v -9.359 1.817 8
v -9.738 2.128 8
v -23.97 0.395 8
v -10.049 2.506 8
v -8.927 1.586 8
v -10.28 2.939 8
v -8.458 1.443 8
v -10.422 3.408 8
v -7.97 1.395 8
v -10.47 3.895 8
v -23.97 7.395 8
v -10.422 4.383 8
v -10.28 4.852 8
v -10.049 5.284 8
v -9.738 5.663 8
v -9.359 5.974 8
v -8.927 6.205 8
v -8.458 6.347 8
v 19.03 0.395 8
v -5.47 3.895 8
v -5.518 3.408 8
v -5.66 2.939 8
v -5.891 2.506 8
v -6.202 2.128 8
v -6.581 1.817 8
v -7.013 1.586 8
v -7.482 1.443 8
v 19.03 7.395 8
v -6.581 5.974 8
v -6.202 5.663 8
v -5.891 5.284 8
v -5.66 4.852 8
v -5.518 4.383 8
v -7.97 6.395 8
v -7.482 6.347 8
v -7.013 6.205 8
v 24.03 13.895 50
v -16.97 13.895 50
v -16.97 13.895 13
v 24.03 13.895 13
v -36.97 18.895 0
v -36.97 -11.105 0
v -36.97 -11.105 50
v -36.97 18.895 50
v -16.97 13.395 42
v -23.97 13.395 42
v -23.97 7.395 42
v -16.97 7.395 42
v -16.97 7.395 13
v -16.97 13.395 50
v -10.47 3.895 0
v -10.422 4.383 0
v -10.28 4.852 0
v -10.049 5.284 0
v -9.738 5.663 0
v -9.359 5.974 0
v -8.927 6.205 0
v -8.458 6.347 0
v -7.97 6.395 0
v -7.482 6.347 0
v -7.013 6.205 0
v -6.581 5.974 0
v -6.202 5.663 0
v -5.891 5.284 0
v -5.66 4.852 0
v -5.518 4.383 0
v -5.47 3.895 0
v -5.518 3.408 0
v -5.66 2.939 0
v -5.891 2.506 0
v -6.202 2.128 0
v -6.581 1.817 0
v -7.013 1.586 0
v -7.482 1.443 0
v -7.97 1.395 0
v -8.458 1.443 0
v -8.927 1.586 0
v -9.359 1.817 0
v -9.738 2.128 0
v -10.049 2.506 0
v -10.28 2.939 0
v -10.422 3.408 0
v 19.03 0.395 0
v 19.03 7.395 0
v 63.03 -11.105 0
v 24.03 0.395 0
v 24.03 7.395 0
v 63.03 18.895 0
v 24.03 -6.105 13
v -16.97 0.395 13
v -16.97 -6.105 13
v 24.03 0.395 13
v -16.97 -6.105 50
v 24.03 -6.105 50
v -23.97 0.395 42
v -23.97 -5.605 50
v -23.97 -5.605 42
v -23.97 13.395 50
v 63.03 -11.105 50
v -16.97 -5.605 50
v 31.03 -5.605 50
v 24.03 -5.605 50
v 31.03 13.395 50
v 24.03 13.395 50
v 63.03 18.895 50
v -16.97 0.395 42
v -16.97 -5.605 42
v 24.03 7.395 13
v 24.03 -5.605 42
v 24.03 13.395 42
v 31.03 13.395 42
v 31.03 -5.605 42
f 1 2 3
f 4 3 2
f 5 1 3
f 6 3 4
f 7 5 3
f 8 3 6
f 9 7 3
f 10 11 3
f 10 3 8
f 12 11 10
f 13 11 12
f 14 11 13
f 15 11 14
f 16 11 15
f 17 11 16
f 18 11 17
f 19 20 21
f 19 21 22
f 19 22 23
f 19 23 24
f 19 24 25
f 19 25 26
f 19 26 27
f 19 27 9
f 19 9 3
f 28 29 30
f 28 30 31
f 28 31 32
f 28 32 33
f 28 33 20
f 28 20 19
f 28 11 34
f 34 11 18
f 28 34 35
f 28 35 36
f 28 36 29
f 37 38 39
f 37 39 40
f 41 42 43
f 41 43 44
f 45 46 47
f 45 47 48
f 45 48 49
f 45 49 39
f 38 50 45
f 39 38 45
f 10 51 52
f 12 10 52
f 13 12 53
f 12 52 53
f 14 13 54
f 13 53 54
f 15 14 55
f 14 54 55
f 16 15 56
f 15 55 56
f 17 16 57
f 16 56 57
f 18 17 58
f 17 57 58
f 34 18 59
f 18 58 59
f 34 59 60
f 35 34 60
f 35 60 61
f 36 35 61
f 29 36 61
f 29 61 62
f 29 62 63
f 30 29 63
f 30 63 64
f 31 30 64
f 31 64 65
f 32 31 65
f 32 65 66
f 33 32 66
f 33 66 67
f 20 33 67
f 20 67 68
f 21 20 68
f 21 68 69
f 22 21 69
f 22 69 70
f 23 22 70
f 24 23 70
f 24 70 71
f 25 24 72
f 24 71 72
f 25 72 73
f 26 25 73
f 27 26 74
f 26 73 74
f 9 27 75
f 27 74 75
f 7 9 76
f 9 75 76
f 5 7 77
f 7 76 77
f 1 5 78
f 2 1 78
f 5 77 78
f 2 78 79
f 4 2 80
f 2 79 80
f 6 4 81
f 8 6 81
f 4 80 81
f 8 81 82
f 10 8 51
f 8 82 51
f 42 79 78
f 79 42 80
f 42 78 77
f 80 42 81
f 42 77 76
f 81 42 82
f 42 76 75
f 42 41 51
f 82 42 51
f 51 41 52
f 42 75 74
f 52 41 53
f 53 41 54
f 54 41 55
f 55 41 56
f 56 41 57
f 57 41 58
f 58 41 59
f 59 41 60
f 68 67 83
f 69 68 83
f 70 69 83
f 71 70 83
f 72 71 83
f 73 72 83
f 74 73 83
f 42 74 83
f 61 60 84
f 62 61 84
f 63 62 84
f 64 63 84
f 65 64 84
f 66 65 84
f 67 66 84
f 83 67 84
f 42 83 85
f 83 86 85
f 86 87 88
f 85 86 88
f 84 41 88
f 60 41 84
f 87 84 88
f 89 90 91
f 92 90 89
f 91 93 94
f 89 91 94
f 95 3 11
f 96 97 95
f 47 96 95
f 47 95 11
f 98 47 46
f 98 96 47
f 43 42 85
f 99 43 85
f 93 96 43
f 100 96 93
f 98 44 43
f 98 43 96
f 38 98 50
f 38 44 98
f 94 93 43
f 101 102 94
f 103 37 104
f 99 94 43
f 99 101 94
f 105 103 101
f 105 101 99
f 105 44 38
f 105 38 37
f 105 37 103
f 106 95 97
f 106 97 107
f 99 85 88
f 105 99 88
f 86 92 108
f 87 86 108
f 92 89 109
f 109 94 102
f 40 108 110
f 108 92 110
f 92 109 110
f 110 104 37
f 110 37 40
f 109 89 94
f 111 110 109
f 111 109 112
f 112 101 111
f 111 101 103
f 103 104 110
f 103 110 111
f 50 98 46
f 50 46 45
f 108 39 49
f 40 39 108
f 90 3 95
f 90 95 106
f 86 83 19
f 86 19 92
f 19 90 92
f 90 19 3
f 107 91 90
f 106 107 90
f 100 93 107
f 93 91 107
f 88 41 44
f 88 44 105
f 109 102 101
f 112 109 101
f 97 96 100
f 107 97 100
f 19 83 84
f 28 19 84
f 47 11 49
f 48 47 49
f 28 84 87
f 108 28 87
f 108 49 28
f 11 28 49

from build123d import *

# Parameters (mm, degrees)
SKETCH_1_W          = 100
SKETCH_1_H          = 30
EXTRUDE_1_DEPTH     = 50
SKETCH_2_W          = 41
SKETCH_2_H          = 20
CUT_EXTRUDE_1_DEPTH = 37
SKETCH_3_W          = 7
SKETCH_3_H          = 19
CUT_EXTRUDE_2_DEPTH = 8
SKETCH_4_W          = 7
SKETCH_4_H          = 7
CUT_EXTRUDE_3_DEPTH = 29
SKETCH_5_W          = 48
SKETCH_5_H          = 7
CUT_EXTRUDE_4_DEPTH = 5
CUT_EXTRUDE_5_REACH = 80.063
SKETCH_6_W          = 5
SKETCH_6_H          = 7
CUT_EXTRUDE_6_REACH = 84.643
SKETCH_7_R          = 2.5


with BuildPart() as part:
    # 草圖1 → 填料-伸長1 (new body)
    with BuildSketch(Plane.XY):
        with Locations((13.030079174, 3.895348837)):
            Rectangle(SKETCH_1_W, SKETCH_1_H)
    extrude(amount=EXTRUDE_1_DEPTH)

    # 草圖2 → 除料-伸長1 (cut)
    with BuildSketch(Plane.XY.offset(50)):
        with Locations((3.530079174, 3.895348837)):
            Rectangle(SKETCH_2_W, SKETCH_2_H)
    extrude(amount=-CUT_EXTRUDE_1_DEPTH, mode=Mode.SUBTRACT)

    # 草圖3 → 除料-伸長2 (cut)
    with BuildSketch(Plane.XY.offset(50)):
        with Locations((27.530079174, 3.895348837)):
            Rectangle(SKETCH_3_W, SKETCH_3_H)
        with Locations((-20.469920826, 3.895348837)):
            Rectangle(SKETCH_3_W, SKETCH_3_H)
    extrude(amount=-CUT_EXTRUDE_2_DEPTH, mode=Mode.SUBTRACT)

    # 草圖4 → 除料-伸長3 (cut)
    with BuildSketch(Plane.XY.offset(42)):
        with Locations((-20.469920826, 3.895348837)):
            Rectangle(SKETCH_4_W, SKETCH_4_H)
    extrude(amount=-CUT_EXTRUDE_3_DEPTH, mode=Mode.SUBTRACT)

    # 草圖5 → 除料-伸長4 (cut)
    with BuildSketch(Plane.XY.offset(13)):
        with Locations((0.030079174, 3.895348837)):
            Rectangle(SKETCH_5_W, SKETCH_5_H)
    extrude(amount=-CUT_EXTRUDE_4_DEPTH, mode=Mode.SUBTRACT)

    # 草圖6 → 除料-伸長5 (cut, up to next)
    with BuildSketch(Plane.XY.offset(8), mode=Mode.PRIVATE) as cut_extrude_5_sk1:
        with Locations((21.530079174, 3.895348837)):
            Rectangle(SKETCH_6_W, SKETCH_6_H)
    cut_extrude_5_tool1 = extrude(cut_extrude_5_sk1.sketch, amount=-CUT_EXTRUDE_5_REACH, mode=Mode.PRIVATE) & part.part
    add(cut_extrude_5_tool1.solids().sort_by_distance((21.530079, 3.895349, 8))[0], mode=Mode.SUBTRACT)

    # 草圖7 → 除料-伸長6 (cut, up to next)
    with BuildSketch(Plane(origin=(0, 0, 0), x_dir=(-1, 0, 0), z_dir=(0, 0, -1)), mode=Mode.PRIVATE) as cut_extrude_6_sk1:
        with Locations((7.969920826, 3.895348837)):
            Circle(SKETCH_7_R)
    cut_extrude_6_tool1 = extrude(cut_extrude_6_sk1.sketch, amount=-CUT_EXTRUDE_6_REACH, mode=Mode.PRIVATE) & part.part
    add(cut_extrude_6_tool1.solids().sort_by_distance((-7.969921, 3.895349, 0))[0], mode=Mode.SUBTRACT)


solid = part.part
